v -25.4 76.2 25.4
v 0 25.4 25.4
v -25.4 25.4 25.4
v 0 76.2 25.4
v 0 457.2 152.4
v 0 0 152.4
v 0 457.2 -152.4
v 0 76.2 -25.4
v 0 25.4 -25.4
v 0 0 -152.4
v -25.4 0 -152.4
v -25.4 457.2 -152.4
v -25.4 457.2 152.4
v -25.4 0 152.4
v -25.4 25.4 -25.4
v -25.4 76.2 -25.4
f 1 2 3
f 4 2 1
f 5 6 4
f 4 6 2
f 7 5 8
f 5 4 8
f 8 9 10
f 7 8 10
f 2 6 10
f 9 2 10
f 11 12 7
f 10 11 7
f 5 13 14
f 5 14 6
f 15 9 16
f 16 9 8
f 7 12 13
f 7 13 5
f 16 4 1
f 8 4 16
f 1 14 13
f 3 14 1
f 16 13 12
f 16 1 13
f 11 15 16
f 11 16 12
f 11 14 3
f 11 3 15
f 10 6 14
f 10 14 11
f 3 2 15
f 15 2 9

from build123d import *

# Parameters (mm, degrees)
CROQUIS1_W              = 304.8
CROQUIS1_H              = 304.8
SALIENTE_EXTRUIR1_DEPTH = 25.4
CROQUIS3_W              = 50.8
CROQUIS3_H              = 50.8
CORTAR_EXTRUIR2_DEPTH   = 25.4
SKETCH1_W               = 25.4
SKETCH1_H               = 304.8
BOSS_EXTRUDE1_DEPTH     = 152.4


with BuildPart() as part:
    # Croquis1 → Saliente-Extruir1 (new body)
    with BuildSketch(Plane(origin=(0, 0, 0), x_dir=(0, 0, -1), z_dir=(1, 0, 0))):
        with Locations((0, 152.4)):
            Rectangle(CROQUIS1_W, CROQUIS1_H)
    extrude(amount=-SALIENTE_EXTRUIR1_DEPTH)

    # Croquis3 → Cortar-Extruir2 (cut)
    with BuildSketch(Plane(origin=(0, 0, 0), x_dir=(0, 0, -1), z_dir=(1, 0, 0))):
        with Locations((0, 50.8)):
            Rectangle(CROQUIS3_W, CROQUIS3_H)
    extrude(amount=-CORTAR_EXTRUIR2_DEPTH, mode=Mode.SUBTRACT)

    # Sketch1 → Boss-Extrude1 (add)
    with BuildSketch(Plane(origin=(0, 304.8, 0), x_dir=(1, 0, 0), z_dir=(0, 1, 0))):
        with Locations((-12.7, 0)):
            Rectangle(SKETCH1_W, SKETCH1_H)
    extrude(amount=BOSS_EXTRUDE1_DEPTH)


solid = part.part
